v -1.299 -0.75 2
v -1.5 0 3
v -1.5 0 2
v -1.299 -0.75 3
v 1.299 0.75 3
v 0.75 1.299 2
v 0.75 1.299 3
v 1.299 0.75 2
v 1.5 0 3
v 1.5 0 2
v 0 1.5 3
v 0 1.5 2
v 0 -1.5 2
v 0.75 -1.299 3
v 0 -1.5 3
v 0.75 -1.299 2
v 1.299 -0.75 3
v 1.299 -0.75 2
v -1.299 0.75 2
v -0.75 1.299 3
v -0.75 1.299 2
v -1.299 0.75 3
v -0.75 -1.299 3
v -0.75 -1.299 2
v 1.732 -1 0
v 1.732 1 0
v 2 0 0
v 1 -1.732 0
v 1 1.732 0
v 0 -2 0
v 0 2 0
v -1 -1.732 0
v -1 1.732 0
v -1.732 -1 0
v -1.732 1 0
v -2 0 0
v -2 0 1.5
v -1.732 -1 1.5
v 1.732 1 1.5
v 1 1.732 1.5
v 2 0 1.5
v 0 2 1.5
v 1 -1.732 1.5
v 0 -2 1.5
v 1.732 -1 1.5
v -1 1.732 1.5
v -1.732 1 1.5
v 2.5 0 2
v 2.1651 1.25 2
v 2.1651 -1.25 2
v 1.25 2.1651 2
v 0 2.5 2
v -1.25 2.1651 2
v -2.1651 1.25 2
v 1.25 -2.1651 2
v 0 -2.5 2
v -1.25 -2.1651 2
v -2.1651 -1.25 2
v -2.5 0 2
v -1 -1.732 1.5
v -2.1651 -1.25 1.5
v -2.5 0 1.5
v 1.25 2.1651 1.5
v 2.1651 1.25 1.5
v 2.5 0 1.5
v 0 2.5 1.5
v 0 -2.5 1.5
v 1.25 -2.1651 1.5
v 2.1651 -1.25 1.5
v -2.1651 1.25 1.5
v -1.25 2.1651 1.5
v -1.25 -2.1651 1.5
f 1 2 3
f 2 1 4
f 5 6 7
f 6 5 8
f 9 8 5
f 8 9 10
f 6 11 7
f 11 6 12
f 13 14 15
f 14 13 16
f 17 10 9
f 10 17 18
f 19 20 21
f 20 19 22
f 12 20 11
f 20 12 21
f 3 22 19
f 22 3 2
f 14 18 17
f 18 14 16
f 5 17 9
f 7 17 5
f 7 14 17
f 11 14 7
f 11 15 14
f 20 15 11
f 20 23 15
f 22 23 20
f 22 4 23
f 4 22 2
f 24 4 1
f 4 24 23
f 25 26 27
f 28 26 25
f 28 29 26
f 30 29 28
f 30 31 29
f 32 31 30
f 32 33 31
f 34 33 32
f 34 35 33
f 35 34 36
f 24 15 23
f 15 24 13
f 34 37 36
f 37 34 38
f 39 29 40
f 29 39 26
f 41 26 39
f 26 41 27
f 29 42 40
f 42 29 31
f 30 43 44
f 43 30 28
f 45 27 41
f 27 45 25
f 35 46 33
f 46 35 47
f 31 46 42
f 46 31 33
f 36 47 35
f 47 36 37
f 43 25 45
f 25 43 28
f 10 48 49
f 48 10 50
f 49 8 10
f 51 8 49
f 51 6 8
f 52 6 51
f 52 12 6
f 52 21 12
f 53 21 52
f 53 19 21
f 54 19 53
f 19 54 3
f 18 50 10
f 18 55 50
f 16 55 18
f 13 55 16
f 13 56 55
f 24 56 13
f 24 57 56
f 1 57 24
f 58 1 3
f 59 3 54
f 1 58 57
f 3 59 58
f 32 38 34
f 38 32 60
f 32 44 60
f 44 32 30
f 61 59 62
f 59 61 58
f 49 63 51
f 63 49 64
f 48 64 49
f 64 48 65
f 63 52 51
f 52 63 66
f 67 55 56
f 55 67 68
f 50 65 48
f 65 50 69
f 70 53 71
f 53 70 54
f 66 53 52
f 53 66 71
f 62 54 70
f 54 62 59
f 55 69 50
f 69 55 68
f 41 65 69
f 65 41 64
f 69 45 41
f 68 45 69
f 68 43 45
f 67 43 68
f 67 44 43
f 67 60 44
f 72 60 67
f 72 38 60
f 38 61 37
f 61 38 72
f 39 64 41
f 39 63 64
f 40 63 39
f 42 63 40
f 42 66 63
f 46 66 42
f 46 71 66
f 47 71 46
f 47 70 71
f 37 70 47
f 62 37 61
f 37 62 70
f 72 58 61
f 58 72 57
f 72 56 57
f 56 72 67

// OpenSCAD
// plate round 1x1

// external vars #########################

// part ##################################

module plate_round_1x1() {
  $fn = 12;
  union() {
    cylinder(h=3,d=3); cylinder(h=2,d=4);
    translate([0,0,1.5]) cylinder(h=0.5,d=5);
  }
}

plate_round_1x1();
